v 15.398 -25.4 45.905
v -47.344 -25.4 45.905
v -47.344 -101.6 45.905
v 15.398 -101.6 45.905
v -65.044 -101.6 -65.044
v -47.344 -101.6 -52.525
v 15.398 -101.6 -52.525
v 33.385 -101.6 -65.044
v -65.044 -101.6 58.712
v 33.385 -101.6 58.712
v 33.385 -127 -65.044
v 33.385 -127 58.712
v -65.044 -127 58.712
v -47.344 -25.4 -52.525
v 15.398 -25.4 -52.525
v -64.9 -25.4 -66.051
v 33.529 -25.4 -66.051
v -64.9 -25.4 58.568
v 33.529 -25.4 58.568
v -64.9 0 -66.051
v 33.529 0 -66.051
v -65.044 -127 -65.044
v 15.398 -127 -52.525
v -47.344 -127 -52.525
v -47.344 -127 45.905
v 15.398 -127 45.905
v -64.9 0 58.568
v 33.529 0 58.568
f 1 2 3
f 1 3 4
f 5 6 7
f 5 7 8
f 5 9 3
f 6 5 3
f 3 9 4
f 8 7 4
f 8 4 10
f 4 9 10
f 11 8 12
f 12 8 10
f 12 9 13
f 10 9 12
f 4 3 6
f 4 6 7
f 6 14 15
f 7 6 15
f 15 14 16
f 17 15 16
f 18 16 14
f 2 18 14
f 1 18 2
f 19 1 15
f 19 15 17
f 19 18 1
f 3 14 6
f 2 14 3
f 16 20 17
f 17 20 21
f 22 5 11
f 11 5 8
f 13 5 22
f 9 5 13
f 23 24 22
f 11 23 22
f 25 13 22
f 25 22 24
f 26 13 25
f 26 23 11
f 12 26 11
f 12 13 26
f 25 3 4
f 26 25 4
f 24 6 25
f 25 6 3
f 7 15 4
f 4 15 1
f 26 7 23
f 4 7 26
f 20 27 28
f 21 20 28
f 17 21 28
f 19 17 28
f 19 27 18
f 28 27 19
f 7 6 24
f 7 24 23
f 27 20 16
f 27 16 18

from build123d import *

# Parameters (mm, degrees)
F0_W     = 98.429568
F0_H     = 124.619898
F1_DEPTH = 25.4
F2_W     = 62.741655
F2_H     = 98.429572
F3_DEPTH = 101.6
F4_W     = 98.429565
F4_H     = 123.756472
F4_W_2   = 62.741655
F4_H_2   = 98.429572
F5_DEPTH = 25.4


with BuildPart() as f1:
    # F0 (on Front) → F1 (new body)
    with BuildSketch(Plane.XZ):
        with Locations((-15.685413, -3.741475)):
            Rectangle(F0_W, F0_H)
    extrude(amount=F1_DEPTH)

    # F2 (on Front) → F3 (join)
    with BuildSketch(Plane.XZ):
        with Locations((-15.973221, -3.309766)):
            Rectangle(F2_W, F2_H)
    extrude(amount=F3_DEPTH)


with BuildPart() as f5:
    # F4 (on face) → F5 (new body)
    with BuildSketch(Plane.XZ.offset(101.6)):
        with Locations((-15.829315, -3.165862)):
            Rectangle(F4_W, F4_H)
        with Locations((-15.973221, -3.309766)):
            Rectangle(F4_W_2, F4_H_2, mode=Mode.SUBTRACT)
    extrude(amount=F5_DEPTH)


solid = Compound([f1.part, f5.part])
